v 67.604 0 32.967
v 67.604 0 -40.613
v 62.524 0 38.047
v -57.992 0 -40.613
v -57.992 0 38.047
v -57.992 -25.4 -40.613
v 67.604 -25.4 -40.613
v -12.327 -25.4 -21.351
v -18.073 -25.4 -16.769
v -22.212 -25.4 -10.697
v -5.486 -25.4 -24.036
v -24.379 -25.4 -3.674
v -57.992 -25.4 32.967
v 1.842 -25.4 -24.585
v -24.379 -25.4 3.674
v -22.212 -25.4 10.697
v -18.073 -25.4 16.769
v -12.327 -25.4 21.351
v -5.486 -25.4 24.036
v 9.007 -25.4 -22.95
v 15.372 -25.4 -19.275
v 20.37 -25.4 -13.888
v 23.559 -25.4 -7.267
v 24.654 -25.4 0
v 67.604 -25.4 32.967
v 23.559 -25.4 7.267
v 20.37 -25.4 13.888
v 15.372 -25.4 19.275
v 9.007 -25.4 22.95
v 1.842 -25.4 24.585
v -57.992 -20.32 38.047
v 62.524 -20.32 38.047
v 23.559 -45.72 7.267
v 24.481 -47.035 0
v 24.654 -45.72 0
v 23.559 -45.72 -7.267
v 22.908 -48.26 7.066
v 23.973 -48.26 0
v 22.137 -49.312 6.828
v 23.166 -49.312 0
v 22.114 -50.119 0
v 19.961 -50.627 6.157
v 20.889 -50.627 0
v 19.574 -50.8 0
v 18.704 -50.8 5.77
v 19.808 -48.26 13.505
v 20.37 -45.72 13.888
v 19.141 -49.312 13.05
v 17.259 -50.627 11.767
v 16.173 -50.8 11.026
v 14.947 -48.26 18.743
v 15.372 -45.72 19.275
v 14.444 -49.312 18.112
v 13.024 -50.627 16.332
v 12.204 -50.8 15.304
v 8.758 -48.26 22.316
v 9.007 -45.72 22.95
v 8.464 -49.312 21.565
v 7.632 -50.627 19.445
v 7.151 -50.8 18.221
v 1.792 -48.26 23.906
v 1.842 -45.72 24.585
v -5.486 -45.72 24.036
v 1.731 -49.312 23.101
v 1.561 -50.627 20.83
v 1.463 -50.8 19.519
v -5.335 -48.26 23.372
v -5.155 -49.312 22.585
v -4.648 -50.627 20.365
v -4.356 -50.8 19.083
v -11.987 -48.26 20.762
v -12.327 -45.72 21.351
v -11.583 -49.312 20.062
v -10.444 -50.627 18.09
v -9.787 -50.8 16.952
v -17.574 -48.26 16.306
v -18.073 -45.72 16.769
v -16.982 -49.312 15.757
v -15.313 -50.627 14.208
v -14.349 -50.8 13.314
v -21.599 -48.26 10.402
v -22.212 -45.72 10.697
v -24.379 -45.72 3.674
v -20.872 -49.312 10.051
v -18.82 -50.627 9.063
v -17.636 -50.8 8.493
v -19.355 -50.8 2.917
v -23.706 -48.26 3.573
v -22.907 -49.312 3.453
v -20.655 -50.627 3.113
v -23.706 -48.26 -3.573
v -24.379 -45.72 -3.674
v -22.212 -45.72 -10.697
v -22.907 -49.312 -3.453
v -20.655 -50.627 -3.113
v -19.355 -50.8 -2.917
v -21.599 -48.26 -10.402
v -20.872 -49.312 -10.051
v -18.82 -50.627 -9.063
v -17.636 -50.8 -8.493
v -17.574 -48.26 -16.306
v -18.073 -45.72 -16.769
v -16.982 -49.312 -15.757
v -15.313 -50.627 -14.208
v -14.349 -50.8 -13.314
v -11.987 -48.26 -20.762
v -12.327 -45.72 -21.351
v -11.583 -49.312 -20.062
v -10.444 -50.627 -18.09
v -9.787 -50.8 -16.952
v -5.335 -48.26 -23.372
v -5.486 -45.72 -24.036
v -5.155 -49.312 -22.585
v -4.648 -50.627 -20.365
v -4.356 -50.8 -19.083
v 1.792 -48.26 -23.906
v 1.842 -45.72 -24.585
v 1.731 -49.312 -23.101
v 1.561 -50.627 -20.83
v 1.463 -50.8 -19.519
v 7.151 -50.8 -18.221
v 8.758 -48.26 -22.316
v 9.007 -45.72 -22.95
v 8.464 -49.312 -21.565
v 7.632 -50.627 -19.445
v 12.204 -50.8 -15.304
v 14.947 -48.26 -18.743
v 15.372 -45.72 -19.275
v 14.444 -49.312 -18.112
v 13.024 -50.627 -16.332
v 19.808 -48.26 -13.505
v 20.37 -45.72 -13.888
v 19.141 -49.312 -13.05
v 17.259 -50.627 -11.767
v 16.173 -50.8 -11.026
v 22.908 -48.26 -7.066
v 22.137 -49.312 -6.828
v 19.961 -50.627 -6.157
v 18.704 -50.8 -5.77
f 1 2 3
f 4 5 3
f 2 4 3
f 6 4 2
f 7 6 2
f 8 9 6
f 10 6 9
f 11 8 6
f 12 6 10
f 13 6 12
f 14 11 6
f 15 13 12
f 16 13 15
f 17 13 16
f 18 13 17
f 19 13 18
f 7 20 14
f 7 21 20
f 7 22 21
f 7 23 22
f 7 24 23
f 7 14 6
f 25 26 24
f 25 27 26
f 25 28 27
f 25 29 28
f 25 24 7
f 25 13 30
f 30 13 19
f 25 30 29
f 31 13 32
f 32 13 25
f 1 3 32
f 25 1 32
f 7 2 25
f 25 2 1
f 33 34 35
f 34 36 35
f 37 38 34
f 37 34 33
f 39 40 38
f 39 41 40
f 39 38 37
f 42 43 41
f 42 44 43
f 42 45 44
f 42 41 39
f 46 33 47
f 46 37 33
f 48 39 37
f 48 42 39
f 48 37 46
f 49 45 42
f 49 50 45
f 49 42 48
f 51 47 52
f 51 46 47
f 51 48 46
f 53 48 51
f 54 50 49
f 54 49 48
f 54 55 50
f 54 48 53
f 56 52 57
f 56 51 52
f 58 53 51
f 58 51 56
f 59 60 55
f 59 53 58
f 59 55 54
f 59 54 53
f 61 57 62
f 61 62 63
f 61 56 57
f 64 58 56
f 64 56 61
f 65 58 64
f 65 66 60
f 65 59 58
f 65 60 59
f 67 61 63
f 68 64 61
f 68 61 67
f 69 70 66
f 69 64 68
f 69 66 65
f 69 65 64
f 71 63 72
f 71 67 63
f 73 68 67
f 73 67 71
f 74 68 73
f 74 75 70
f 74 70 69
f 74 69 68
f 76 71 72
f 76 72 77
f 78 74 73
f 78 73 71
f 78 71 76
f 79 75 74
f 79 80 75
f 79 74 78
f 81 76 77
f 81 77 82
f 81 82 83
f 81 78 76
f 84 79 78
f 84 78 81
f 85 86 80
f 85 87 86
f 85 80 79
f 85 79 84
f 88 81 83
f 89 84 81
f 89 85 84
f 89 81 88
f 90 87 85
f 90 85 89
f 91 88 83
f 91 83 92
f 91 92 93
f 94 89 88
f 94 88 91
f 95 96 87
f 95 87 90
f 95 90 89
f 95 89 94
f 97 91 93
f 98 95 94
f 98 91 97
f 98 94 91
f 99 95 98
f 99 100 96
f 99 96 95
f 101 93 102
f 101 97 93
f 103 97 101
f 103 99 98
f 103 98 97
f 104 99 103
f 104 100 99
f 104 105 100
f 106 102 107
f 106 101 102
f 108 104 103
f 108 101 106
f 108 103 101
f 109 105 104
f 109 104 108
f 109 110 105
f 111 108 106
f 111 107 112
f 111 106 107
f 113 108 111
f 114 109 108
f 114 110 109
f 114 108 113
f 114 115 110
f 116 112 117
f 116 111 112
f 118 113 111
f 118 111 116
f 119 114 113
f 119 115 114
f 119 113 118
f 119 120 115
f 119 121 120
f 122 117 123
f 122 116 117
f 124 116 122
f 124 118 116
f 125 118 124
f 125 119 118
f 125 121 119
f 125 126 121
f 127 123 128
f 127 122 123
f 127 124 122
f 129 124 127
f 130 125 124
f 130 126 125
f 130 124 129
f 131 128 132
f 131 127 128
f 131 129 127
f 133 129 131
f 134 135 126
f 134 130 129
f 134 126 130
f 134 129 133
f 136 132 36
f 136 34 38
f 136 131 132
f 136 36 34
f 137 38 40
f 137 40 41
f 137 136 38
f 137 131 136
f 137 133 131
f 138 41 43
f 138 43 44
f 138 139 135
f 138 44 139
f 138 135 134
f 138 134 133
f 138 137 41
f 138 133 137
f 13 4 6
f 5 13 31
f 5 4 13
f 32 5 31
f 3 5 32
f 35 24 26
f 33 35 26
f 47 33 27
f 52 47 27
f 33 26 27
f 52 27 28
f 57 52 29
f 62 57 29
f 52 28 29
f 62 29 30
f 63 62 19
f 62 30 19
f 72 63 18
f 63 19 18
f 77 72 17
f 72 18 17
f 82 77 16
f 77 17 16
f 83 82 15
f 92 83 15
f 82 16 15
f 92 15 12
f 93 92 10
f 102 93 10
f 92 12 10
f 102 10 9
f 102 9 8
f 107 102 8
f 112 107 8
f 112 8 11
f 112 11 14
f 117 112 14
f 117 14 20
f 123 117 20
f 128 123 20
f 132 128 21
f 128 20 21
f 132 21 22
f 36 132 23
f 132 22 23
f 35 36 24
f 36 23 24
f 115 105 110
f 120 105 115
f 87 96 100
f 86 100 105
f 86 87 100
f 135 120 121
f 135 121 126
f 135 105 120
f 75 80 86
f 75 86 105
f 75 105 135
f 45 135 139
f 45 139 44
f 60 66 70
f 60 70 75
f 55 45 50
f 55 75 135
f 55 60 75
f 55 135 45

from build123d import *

# Parameters (mm, degrees)
F0_W     = 125.596717
F0_H     = 78.660075
F1_DEPTH = 25.4
F2_SIZE  = 5.08
F3_R     = 24.65401
F4_DEPTH = 25.4
F5_R     = 5.08


with BuildPart() as f1:
    # F0 (on Front) → F1 (new body)
    with BuildSketch(Plane.XZ):
        with Locations((4.805998, -1.282626)):
            Rectangle(F0_W, F0_H)
    extrude(amount=F1_DEPTH)

    # F2
    f2_edges = [f1.edges().sort_by_distance(p)[0] for p in [
        (67.604356, -12.7, 38.047411),
        (4.805997, -25.4, 38.047411),
    ]]
    chamfer(f2_edges, length=F2_SIZE)

    # F3 (on face) → F4 (join)
    with BuildSketch(Plane.XZ.offset(25.4)):
        Circle(F3_R)
    extrude(amount=F4_DEPTH)

    # F5
    f5_edges = [f1.edges().sort_by_distance(p)[0] for p in [
        (-24.65401, -50.8, 0),
    ]]
    fillet(f5_edges, radius=F5_R)


solid = f1.part
